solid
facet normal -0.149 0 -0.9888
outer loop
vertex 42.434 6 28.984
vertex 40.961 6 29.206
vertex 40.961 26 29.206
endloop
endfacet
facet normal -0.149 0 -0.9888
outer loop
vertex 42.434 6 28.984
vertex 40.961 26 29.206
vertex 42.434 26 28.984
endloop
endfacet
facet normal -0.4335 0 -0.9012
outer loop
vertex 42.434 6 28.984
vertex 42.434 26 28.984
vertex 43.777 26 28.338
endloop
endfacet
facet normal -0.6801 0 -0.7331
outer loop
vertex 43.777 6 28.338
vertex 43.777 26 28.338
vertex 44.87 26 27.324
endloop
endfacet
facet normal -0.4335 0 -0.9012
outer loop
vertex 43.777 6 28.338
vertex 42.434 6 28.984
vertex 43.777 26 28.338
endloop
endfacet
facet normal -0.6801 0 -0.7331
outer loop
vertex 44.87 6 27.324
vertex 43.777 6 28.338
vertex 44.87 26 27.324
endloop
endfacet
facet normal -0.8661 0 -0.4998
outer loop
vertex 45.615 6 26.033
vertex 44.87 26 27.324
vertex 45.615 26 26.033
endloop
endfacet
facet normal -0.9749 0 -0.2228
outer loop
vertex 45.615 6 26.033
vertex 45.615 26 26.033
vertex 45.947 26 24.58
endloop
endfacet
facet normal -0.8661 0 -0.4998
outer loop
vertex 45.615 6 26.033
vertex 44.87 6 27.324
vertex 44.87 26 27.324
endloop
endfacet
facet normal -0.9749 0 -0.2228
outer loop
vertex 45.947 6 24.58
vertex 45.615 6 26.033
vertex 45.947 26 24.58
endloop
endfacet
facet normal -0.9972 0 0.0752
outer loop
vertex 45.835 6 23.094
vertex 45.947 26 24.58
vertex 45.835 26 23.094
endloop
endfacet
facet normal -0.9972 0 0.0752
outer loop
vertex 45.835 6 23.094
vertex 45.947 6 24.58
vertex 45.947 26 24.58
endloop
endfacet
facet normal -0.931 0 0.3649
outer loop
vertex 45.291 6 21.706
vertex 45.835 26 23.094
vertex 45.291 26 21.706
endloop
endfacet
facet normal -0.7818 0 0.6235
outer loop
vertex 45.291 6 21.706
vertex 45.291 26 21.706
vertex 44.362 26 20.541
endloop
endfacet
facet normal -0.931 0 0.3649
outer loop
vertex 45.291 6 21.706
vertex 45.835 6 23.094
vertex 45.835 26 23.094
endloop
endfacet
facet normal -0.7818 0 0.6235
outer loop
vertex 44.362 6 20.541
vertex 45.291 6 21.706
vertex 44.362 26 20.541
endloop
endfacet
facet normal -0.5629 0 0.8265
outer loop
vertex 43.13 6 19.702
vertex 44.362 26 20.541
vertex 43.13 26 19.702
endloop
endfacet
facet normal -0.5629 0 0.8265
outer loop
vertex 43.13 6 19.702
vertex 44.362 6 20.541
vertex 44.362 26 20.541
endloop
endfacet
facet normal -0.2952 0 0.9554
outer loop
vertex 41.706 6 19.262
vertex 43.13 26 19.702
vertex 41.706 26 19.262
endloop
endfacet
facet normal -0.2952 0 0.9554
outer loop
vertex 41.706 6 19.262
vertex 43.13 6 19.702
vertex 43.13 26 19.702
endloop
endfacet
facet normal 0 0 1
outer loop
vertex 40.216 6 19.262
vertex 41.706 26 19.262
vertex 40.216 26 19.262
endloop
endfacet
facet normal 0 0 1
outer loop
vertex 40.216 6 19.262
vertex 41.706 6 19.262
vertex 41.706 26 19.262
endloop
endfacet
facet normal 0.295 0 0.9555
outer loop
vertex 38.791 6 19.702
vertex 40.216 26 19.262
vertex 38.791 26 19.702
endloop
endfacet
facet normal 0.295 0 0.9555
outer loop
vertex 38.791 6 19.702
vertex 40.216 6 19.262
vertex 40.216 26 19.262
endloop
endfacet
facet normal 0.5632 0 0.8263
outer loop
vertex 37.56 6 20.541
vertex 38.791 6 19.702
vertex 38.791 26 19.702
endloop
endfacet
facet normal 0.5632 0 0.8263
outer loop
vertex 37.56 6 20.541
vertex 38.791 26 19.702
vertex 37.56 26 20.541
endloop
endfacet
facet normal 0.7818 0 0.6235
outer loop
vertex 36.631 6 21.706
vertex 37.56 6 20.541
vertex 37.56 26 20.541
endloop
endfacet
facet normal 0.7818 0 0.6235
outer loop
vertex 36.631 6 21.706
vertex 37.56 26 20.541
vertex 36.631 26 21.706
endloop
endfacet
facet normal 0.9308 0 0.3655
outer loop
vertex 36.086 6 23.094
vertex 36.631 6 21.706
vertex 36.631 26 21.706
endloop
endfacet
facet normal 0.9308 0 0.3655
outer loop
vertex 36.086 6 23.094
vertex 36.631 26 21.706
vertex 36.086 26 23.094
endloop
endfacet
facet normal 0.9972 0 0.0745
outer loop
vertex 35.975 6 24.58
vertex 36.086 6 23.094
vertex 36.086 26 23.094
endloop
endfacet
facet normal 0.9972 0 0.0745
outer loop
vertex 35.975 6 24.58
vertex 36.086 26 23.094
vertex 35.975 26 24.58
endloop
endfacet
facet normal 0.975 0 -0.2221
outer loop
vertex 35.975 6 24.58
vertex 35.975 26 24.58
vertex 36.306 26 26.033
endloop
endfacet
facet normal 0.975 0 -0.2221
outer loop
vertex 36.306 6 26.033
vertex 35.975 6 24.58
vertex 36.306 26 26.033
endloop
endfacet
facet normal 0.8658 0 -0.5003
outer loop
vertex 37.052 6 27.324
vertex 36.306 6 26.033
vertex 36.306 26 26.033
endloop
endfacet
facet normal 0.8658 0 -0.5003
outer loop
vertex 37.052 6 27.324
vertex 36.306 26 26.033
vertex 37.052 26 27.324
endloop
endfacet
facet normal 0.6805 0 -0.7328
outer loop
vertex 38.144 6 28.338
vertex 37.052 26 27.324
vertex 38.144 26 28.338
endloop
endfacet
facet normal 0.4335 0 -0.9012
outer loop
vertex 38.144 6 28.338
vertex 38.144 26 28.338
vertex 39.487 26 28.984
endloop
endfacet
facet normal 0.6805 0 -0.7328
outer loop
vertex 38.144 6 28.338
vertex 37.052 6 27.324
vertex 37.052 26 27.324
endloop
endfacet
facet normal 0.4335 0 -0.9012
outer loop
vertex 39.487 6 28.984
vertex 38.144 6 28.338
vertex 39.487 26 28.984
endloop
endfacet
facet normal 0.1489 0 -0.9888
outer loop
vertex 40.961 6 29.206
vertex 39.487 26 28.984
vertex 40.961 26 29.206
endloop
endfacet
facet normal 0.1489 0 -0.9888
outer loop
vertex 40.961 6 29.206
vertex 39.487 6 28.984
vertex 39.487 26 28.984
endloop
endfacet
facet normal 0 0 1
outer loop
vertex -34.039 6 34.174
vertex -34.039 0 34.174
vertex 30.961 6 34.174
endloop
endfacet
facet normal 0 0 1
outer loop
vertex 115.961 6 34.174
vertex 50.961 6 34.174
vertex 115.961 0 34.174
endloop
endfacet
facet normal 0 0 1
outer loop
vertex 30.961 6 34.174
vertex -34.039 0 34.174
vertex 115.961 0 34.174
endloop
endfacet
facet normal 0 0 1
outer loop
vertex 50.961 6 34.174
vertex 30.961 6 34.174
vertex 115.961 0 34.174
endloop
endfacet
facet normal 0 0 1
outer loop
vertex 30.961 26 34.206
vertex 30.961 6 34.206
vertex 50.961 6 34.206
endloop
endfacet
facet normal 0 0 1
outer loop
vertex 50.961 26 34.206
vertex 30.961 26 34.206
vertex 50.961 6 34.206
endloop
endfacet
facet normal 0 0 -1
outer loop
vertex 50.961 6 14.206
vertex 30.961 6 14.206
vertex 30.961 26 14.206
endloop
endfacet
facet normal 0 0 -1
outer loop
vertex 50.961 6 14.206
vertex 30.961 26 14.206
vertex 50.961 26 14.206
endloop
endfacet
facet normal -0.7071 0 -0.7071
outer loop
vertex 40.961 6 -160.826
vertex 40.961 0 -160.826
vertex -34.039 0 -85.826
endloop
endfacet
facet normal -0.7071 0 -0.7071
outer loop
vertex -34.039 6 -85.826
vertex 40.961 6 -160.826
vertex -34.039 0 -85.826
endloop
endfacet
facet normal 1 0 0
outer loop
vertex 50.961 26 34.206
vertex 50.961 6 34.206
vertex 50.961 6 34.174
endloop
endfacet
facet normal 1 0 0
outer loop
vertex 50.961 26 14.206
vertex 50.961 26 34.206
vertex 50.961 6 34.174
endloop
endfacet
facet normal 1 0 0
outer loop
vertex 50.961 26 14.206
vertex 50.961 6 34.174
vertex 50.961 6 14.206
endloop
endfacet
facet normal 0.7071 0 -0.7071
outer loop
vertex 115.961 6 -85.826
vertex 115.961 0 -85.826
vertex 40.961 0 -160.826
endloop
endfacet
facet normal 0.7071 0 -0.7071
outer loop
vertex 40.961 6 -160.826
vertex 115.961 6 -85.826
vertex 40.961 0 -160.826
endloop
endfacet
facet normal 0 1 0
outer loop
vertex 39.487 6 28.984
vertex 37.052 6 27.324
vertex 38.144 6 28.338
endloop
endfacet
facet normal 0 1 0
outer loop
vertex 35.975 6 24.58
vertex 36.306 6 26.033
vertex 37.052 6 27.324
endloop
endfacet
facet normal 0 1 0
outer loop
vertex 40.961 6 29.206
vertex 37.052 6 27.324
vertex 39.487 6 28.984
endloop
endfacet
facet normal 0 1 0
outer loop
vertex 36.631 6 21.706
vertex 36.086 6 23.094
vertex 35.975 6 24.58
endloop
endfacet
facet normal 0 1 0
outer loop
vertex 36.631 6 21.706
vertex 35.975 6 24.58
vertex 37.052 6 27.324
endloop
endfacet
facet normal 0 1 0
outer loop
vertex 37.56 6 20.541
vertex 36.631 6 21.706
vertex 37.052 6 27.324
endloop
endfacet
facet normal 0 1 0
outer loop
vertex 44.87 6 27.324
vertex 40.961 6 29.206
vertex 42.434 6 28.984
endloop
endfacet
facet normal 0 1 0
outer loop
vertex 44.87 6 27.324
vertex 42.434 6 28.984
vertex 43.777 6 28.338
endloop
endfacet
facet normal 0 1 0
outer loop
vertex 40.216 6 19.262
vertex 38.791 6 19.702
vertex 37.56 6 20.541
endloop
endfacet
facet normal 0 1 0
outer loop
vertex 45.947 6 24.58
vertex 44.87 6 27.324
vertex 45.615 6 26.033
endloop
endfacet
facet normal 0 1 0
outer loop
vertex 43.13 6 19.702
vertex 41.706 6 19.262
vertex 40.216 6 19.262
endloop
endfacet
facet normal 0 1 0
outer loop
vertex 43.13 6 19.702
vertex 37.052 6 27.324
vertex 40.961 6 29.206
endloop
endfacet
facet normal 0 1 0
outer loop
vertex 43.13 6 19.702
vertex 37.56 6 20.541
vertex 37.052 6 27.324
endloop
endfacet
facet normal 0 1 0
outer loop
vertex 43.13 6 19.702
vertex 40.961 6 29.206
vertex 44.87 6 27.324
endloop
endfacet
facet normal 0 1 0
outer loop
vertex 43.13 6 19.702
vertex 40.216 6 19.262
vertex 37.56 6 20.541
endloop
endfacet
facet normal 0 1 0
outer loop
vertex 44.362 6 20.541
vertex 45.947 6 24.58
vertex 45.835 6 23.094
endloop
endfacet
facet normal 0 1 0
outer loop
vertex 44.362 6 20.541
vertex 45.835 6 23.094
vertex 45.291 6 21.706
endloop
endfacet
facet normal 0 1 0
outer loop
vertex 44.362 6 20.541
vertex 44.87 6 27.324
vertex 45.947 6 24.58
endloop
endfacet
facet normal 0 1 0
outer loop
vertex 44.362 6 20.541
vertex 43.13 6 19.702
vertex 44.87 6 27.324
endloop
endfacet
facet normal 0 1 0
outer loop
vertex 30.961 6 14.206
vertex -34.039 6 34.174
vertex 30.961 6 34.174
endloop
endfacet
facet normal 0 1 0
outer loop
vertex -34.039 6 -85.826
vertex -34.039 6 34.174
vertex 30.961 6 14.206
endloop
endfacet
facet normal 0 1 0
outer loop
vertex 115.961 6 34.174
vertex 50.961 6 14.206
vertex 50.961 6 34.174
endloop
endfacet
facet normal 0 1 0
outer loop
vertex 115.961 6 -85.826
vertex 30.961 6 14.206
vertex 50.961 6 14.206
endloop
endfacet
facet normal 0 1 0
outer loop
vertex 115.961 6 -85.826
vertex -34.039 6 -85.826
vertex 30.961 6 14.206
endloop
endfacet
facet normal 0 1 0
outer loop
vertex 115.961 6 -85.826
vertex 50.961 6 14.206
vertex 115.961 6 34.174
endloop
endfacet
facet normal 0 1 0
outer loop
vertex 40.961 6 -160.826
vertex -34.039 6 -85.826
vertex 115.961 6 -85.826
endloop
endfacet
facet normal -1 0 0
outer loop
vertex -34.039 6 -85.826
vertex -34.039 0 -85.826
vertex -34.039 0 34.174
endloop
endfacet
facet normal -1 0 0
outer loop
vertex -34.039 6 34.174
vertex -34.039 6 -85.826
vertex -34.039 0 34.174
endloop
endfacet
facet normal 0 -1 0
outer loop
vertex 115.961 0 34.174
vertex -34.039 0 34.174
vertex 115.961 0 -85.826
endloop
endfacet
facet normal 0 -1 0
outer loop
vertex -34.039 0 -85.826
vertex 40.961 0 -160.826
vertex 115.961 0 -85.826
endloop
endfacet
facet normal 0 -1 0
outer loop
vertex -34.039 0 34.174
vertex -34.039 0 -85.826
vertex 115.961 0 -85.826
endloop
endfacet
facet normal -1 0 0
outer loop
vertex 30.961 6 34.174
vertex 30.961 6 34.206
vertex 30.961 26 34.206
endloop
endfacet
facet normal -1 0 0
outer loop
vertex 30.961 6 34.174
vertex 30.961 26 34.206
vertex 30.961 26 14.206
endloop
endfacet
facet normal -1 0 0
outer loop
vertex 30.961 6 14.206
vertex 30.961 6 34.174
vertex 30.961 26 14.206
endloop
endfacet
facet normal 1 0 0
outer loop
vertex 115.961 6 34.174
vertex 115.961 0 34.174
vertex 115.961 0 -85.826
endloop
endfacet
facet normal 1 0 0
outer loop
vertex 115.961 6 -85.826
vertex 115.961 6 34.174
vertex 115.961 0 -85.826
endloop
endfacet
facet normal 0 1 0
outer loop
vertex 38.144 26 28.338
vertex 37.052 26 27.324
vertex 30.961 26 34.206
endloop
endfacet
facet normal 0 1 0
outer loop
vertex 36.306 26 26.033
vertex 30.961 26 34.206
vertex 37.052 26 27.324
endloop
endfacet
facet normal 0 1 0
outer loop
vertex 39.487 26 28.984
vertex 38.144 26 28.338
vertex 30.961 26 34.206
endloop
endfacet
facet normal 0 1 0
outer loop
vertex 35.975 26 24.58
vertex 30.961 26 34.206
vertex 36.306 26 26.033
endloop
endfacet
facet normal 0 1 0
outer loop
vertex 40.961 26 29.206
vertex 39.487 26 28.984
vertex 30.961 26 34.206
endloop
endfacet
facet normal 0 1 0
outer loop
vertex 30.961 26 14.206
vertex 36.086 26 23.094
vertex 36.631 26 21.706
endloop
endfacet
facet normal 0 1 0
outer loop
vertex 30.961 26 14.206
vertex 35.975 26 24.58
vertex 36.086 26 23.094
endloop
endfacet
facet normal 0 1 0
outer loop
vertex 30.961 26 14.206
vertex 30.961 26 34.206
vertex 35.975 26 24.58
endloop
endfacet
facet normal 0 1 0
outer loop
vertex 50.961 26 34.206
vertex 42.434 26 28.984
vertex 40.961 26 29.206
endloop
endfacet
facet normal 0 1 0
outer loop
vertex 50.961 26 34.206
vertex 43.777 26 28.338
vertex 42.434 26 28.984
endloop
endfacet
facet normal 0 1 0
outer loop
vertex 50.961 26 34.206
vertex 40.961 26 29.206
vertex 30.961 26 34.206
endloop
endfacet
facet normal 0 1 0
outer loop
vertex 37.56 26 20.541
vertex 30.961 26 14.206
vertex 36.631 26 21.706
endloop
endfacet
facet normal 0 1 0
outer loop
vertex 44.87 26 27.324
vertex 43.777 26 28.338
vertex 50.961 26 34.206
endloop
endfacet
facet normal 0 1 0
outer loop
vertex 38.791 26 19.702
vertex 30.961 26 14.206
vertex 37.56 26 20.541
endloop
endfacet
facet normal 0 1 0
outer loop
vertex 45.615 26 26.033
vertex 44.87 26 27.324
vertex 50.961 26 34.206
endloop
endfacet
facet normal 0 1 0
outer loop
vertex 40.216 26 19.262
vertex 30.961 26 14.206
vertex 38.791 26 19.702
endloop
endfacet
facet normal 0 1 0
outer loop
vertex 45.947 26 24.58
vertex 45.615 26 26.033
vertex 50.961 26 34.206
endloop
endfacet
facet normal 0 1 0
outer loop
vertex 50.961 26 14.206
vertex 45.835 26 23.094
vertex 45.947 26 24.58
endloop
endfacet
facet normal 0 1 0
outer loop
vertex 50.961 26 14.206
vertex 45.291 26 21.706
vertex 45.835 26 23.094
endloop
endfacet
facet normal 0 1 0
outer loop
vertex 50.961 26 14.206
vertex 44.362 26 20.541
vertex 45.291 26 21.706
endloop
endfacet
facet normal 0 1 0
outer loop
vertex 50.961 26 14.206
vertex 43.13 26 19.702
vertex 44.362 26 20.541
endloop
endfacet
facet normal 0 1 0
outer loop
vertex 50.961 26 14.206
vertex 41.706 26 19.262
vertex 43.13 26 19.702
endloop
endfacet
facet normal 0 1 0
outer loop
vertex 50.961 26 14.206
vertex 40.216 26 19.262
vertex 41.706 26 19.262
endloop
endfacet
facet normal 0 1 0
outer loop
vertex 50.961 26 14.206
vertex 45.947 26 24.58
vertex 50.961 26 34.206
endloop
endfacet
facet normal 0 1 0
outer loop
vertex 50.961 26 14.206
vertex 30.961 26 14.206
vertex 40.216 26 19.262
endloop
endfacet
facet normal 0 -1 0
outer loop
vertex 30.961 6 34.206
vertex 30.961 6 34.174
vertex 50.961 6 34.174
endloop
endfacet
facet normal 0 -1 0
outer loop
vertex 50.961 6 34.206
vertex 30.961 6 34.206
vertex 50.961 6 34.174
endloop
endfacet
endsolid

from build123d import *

# Parameters (mm, degrees)
BOSS_EXTRUDE1_DEPTH = 6
SKETCH2_W           = 20
SKETCH2_H           = 20
SKETCH2_R           = 5
BOSS_EXTRUDE2_DEPTH = 20


with BuildPart() as part:
    # Sketch1 → Boss-Extrude1 (new body)
    with BuildSketch(Plane(origin=(0, 0, 0), x_dir=(1, 0, 0), z_dir=(0, 1, 0))):
        Polygon((-34.039277024, -34.17435352), (115.960722976, -34.17435352), (115.960722976, 85.82564648), (40.960722976, 160.82564648), (-34.039277024, 85.82564648), align=None)
    extrude(amount=BOSS_EXTRUDE1_DEPTH)

    # Sketch2 → Boss-Extrude2 (add)
    with BuildSketch(Plane(origin=(0, 6, 0), x_dir=(1, 0, 0), z_dir=(0, 1, 0))):
        with Locations((40.960722976, -24.206365995)):
            Rectangle(SKETCH2_W, SKETCH2_H)
        with Locations(Location((40.960722976, -24.206365995, 0), (0, 0, 270))):
            Circle(SKETCH2_R, mode=Mode.SUBTRACT)
    extrude(amount=BOSS_EXTRUDE2_DEPTH)


solid = part.part
